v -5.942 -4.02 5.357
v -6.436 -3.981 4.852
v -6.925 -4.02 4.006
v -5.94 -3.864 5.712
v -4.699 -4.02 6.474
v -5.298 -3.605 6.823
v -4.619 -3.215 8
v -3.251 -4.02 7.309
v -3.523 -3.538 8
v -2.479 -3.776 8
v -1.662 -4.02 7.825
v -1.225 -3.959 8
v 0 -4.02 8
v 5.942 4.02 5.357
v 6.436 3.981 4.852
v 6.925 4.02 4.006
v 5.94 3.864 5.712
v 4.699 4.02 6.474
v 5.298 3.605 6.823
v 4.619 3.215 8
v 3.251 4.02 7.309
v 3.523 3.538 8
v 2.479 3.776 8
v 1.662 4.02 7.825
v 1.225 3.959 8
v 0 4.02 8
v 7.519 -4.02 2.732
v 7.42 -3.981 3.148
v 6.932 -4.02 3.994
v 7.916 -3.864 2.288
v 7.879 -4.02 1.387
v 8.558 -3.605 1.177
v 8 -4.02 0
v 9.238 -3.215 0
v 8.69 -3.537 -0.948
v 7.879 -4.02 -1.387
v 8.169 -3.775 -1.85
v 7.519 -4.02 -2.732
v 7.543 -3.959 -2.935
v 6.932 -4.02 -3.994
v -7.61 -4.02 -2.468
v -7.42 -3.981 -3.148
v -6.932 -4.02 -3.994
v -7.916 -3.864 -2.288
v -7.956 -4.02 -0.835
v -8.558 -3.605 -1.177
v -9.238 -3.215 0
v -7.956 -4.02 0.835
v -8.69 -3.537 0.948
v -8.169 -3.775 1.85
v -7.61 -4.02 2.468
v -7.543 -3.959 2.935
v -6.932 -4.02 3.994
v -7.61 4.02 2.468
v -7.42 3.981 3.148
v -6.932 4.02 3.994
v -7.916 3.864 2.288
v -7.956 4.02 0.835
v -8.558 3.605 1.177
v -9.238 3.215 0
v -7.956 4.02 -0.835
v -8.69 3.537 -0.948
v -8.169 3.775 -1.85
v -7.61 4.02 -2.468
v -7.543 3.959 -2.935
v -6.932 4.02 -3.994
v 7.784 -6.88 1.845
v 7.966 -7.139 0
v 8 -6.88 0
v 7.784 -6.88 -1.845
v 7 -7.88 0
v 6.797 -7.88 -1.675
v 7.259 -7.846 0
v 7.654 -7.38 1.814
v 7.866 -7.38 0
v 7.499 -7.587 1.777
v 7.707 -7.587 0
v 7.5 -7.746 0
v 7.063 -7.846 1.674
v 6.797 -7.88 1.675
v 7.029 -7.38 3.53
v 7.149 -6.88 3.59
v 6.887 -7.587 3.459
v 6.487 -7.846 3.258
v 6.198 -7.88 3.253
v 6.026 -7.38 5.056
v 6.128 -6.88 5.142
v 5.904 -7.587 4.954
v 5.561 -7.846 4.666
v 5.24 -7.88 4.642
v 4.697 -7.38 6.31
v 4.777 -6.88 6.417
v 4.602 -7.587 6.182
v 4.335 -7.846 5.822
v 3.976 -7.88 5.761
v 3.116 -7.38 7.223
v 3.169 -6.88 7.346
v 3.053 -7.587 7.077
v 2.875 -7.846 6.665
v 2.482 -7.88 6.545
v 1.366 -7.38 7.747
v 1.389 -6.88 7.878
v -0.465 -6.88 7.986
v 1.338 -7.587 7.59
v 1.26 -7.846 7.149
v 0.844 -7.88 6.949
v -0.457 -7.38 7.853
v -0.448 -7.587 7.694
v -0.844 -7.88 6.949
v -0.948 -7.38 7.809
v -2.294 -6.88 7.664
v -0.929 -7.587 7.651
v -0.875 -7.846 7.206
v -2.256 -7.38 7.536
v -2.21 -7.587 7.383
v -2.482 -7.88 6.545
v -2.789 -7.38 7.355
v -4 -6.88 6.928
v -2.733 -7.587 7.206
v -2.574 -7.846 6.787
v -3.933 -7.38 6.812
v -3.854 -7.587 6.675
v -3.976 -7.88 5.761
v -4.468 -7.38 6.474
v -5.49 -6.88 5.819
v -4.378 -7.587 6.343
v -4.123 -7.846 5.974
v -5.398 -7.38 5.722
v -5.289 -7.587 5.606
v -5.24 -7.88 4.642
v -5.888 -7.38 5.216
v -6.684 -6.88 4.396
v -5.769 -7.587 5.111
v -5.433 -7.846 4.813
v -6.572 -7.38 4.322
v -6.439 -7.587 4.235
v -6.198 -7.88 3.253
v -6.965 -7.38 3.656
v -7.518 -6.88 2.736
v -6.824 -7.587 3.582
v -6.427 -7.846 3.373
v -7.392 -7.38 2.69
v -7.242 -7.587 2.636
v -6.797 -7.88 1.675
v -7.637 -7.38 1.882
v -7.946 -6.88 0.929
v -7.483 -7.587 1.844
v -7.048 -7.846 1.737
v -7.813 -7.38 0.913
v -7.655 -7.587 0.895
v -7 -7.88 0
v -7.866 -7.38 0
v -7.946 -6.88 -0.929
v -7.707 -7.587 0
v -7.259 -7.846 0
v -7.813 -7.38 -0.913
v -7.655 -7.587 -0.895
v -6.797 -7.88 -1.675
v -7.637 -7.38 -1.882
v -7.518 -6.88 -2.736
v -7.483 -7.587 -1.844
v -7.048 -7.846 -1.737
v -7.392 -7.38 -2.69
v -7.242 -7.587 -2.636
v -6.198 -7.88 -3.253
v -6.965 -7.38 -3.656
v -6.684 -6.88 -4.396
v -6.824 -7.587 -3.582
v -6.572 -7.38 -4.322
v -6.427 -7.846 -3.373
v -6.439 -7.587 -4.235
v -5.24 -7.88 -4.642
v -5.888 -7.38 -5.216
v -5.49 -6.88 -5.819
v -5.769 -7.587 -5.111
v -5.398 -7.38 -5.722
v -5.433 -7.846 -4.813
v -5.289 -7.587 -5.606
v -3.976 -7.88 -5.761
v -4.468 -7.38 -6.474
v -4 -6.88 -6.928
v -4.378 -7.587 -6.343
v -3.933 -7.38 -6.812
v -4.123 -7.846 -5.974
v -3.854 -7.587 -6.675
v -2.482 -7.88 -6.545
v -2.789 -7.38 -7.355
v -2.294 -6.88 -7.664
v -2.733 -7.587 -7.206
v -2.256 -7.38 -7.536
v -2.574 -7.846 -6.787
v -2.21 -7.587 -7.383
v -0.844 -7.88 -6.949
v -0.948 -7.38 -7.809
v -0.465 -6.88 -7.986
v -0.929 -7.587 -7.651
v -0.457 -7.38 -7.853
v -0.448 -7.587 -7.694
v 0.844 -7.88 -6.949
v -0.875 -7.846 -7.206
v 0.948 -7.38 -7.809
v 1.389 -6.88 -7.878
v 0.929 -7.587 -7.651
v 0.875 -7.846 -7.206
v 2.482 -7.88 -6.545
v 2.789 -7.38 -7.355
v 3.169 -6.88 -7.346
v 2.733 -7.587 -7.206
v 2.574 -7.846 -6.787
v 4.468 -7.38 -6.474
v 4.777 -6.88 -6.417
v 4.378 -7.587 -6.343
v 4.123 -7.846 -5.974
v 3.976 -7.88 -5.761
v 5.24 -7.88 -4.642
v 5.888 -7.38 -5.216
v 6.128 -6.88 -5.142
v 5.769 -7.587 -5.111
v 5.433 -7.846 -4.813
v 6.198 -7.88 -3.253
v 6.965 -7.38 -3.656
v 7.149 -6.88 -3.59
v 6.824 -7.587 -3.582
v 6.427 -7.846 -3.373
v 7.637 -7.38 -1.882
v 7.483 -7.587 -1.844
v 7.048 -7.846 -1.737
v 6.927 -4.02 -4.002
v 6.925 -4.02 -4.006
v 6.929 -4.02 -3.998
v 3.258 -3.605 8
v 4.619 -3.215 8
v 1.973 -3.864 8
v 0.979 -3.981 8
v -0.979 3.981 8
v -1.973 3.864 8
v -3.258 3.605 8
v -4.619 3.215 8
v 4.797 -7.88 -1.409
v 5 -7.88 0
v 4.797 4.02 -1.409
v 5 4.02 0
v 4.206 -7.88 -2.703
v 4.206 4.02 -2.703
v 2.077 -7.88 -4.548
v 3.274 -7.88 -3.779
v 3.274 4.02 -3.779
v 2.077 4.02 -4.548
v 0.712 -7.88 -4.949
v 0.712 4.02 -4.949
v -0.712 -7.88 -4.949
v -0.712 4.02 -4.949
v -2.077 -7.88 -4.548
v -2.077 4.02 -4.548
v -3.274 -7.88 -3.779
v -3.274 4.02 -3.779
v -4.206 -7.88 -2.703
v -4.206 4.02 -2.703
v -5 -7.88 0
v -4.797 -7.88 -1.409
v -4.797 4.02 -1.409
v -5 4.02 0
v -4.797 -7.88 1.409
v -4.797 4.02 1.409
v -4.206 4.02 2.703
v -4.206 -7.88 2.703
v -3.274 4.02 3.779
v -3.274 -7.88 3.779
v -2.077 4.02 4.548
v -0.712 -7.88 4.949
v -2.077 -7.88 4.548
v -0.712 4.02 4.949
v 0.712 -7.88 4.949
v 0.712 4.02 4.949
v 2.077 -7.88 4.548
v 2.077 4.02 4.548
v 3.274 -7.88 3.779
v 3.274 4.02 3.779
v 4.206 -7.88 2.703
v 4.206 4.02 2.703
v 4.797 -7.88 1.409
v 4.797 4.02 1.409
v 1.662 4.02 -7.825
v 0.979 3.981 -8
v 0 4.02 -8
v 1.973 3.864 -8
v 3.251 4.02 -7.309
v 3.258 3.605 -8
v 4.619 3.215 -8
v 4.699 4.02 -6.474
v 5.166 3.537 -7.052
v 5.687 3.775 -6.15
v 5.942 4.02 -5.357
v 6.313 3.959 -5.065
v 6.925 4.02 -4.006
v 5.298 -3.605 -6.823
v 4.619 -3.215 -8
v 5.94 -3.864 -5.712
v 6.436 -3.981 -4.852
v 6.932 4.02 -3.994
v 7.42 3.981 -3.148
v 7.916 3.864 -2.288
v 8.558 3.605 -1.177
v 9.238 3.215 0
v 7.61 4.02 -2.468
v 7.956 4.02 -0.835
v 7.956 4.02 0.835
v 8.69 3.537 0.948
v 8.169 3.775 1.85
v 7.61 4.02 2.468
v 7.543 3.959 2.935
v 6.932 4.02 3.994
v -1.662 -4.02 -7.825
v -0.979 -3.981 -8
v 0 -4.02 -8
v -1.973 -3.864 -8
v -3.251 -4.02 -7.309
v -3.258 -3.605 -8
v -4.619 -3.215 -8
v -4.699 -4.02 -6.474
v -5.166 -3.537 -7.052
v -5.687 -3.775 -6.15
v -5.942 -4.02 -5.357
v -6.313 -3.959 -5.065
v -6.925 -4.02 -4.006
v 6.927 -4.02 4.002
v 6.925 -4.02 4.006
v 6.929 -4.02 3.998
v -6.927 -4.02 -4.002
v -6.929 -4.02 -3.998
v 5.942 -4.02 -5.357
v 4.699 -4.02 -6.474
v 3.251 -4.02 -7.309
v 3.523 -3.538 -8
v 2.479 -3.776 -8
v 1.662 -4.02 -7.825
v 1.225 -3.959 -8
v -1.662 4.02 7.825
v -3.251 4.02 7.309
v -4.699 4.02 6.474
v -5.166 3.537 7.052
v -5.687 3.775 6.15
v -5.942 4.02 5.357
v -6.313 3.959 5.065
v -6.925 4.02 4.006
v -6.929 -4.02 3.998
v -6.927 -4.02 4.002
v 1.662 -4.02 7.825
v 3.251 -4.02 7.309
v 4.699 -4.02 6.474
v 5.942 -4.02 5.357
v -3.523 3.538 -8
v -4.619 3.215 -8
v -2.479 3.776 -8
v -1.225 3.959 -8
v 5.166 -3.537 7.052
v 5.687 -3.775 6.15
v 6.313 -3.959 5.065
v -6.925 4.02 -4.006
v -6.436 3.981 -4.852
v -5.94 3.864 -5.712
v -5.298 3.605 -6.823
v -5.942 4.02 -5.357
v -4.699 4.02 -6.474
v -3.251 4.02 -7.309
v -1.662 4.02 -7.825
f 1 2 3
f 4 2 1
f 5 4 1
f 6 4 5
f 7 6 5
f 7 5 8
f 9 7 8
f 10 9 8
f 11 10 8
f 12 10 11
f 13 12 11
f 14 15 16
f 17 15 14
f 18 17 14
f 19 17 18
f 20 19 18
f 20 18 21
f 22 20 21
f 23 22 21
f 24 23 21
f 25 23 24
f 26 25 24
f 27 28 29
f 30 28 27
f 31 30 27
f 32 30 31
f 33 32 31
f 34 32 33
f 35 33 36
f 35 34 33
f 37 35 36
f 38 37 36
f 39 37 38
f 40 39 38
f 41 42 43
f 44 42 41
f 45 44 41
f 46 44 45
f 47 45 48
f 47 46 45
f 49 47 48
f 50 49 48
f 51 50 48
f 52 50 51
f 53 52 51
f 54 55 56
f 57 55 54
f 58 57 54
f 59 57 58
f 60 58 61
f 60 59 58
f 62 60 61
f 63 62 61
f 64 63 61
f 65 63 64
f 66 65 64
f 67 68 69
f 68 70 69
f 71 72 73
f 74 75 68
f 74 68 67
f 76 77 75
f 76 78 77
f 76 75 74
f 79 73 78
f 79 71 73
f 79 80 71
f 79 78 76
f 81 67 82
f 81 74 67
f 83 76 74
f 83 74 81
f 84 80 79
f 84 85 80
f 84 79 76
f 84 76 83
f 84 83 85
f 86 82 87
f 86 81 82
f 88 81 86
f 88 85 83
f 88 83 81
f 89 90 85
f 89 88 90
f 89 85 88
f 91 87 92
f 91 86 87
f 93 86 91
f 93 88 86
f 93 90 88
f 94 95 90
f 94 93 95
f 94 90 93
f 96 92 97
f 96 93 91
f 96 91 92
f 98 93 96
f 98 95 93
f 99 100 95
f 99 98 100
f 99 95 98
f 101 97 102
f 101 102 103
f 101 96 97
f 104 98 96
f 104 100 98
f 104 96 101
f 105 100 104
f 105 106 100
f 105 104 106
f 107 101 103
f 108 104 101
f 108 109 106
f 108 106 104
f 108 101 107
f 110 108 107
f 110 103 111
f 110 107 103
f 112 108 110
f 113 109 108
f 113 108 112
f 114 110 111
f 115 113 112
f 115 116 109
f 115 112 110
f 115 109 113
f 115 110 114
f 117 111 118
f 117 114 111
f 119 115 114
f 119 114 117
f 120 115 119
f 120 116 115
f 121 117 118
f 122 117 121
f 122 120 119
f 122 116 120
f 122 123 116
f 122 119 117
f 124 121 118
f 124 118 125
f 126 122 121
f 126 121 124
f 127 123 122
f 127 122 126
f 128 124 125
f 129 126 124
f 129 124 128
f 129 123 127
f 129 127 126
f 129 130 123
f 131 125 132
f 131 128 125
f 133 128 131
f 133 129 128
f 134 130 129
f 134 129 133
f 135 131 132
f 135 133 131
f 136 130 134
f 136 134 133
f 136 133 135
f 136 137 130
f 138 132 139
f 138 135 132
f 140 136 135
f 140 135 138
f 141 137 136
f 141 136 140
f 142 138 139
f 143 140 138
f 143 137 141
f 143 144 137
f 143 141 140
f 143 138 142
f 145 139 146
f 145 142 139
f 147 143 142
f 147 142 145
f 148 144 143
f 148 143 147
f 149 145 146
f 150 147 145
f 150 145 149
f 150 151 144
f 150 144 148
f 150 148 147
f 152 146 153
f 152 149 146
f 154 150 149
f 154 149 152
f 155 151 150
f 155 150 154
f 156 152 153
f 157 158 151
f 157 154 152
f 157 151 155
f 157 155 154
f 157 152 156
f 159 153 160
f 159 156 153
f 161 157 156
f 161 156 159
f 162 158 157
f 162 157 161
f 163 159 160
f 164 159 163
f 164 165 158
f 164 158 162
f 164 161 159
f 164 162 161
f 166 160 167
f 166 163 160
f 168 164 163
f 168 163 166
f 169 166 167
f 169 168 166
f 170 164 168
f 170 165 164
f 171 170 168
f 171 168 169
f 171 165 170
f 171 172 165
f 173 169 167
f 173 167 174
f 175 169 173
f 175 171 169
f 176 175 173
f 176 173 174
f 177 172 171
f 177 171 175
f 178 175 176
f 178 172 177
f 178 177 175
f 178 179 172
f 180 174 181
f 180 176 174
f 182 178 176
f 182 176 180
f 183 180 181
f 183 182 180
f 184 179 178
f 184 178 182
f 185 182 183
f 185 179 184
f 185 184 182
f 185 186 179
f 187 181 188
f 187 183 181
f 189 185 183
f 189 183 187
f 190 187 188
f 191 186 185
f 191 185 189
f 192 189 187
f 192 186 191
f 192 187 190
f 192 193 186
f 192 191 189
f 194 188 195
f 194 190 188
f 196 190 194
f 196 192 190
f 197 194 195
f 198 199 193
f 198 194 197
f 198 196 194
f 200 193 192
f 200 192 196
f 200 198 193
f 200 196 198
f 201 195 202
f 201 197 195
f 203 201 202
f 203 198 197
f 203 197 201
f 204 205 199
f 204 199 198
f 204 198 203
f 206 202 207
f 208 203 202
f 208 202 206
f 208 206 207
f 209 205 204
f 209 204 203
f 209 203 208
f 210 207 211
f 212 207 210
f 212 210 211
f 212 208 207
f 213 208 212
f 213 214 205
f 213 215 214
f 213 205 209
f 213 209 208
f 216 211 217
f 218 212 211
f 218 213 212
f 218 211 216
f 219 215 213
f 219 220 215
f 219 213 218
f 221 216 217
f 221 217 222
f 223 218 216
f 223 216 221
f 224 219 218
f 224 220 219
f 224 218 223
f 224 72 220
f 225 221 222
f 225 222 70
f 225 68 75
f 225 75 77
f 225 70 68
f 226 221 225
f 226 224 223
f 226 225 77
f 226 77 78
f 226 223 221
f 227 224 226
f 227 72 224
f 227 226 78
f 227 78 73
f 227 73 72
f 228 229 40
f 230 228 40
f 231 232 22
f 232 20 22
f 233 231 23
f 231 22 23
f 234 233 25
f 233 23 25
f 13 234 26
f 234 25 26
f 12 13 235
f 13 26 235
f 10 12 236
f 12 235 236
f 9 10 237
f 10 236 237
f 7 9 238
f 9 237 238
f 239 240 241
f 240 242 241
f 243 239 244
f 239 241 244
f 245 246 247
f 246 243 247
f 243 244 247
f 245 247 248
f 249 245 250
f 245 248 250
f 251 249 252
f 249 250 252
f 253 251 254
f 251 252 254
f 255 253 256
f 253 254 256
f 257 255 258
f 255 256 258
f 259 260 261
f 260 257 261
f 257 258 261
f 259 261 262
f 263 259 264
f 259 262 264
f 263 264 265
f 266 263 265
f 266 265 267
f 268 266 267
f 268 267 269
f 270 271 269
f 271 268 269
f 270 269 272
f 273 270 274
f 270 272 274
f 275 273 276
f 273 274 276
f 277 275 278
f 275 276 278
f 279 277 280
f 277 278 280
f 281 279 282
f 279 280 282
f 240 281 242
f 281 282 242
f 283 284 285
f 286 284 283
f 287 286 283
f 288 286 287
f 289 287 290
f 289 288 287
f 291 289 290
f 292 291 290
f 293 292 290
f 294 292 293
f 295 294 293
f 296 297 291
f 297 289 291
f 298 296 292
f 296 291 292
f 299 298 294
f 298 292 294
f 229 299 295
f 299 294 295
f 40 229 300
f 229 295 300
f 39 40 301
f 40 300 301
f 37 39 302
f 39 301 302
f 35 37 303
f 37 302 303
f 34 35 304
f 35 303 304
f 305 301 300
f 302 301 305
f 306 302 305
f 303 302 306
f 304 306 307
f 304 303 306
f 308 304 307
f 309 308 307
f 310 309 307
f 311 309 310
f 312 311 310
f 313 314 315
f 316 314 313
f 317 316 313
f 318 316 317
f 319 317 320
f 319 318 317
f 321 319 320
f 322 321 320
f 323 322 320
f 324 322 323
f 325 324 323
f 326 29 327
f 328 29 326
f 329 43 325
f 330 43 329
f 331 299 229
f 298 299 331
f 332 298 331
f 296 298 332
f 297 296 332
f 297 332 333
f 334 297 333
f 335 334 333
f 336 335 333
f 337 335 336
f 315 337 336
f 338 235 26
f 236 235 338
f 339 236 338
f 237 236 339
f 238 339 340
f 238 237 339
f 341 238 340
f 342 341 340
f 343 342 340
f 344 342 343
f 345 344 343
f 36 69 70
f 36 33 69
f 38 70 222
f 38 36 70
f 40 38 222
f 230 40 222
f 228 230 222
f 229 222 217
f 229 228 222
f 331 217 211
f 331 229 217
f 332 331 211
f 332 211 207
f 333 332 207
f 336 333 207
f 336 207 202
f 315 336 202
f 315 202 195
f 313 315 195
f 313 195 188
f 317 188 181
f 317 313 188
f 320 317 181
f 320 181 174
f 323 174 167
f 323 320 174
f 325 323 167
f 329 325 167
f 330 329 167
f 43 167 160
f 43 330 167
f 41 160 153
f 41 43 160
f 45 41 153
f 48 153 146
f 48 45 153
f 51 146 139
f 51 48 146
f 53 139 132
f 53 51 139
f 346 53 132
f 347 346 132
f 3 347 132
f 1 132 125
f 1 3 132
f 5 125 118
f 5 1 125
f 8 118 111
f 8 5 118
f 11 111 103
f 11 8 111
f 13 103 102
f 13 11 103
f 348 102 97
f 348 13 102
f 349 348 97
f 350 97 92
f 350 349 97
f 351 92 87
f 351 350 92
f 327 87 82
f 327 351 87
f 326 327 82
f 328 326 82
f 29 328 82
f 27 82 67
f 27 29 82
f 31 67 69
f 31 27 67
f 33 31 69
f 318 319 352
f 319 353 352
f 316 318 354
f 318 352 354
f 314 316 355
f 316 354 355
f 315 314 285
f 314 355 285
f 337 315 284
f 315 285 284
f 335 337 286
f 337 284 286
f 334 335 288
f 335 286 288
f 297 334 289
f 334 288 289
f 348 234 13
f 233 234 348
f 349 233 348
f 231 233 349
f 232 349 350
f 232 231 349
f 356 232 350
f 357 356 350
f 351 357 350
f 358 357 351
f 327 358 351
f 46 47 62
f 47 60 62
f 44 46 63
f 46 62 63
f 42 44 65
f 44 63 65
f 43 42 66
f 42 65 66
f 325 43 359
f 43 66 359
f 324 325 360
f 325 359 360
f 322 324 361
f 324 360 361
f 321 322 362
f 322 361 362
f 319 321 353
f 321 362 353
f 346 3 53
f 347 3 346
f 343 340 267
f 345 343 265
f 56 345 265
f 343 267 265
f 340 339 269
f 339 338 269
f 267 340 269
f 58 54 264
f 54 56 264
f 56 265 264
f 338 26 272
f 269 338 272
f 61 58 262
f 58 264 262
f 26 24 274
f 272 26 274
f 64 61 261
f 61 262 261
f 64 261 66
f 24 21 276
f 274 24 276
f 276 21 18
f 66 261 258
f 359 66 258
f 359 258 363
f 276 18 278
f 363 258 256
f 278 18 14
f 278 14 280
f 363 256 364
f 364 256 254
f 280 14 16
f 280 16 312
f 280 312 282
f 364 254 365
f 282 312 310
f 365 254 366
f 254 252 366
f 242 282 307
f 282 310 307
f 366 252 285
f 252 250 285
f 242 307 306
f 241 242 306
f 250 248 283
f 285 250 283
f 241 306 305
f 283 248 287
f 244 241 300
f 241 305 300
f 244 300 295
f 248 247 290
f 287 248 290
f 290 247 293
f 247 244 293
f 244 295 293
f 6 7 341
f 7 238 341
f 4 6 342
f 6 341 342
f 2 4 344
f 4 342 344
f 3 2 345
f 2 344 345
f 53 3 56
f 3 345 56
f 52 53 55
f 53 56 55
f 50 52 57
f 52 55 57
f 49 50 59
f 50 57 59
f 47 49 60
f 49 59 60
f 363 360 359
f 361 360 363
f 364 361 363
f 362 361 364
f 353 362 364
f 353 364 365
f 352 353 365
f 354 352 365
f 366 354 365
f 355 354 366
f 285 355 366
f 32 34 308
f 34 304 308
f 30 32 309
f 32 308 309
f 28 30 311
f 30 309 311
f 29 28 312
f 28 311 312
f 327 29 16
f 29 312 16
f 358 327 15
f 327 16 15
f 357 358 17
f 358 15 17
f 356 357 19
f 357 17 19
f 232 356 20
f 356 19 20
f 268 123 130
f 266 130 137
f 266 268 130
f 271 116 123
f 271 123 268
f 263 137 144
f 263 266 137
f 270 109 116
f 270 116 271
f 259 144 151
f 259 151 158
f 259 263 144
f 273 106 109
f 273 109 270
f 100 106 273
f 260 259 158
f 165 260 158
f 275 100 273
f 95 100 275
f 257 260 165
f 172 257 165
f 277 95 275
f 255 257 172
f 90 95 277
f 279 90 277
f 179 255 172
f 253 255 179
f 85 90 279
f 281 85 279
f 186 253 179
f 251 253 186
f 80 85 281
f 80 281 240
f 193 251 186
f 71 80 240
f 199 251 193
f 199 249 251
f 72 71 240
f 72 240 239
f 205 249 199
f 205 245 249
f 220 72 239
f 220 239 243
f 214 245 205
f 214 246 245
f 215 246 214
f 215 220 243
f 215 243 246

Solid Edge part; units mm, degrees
sketch "Sketch1" plane through (0, 0, 0) normal (0, -1, 0) x (1, 0, 0)
  line L0 (4.6188, 8) -> (-4.6188, 8)
  line L1 (-4.6188, 8) -> (-9.2376, 0)
  line L2 (-9.2376, 0) -> (-4.6188, -8)
  line L3 (-4.6188, -8) -> (4.6188, -8)
  line L4 (4.6188, -8) -> (9.2376, 0)
  line L5 (9.2376, 0) -> (4.6188, 8)
  circle A0 centre (0, 0) radius 5
  dimension "D1" = 10
  dimension "D2" = 16
extrude "Protrusion1" add sketch "Sketch1" along normal mid plane 8.04
sketch "Sketch2" plane through (0, 0, 0) normal (0, 0, 1) x (1, 0, 0)
  line L0 (-9.2376, 3.215) -> (-19.2376, 3.215)
  line L1 (-19.2376, 3.215) -> (-19.2376, 14.02)
  line L2 (-19.2376, 14.02) -> (-8, 14.02)
  line L3 (-8, 14.02) -> (-8, 4.02)
  line L4 (-8, 4.02) -> (-9.2376, 3.215)
revolve "RevolvedCutout1" cut sketch "Sketch2" angle 360 about axis through (0, 0, 0) along (0, 1, 0)
mirror "Mirror1" about plane through (0, 0, 0) normal (0, -1, 0) of "RevolvedCutout1"
sketch "Sketch3" plane through (0, -4.02, 0) normal (0, -1, 0) x (1, 0, 0)
  circle A0 centre (0, 0) radius 8
  circle A1 centre (0, 0) radius 5
extrude "Protrusion2" add sketch "Sketch3" along normal blind 3.86
fillet "Round1" radius 1 1 edges at (-8, -7.88, 0)
cosmetic_thread "Thread1" size "M10"
properties material "Stainless steel"
